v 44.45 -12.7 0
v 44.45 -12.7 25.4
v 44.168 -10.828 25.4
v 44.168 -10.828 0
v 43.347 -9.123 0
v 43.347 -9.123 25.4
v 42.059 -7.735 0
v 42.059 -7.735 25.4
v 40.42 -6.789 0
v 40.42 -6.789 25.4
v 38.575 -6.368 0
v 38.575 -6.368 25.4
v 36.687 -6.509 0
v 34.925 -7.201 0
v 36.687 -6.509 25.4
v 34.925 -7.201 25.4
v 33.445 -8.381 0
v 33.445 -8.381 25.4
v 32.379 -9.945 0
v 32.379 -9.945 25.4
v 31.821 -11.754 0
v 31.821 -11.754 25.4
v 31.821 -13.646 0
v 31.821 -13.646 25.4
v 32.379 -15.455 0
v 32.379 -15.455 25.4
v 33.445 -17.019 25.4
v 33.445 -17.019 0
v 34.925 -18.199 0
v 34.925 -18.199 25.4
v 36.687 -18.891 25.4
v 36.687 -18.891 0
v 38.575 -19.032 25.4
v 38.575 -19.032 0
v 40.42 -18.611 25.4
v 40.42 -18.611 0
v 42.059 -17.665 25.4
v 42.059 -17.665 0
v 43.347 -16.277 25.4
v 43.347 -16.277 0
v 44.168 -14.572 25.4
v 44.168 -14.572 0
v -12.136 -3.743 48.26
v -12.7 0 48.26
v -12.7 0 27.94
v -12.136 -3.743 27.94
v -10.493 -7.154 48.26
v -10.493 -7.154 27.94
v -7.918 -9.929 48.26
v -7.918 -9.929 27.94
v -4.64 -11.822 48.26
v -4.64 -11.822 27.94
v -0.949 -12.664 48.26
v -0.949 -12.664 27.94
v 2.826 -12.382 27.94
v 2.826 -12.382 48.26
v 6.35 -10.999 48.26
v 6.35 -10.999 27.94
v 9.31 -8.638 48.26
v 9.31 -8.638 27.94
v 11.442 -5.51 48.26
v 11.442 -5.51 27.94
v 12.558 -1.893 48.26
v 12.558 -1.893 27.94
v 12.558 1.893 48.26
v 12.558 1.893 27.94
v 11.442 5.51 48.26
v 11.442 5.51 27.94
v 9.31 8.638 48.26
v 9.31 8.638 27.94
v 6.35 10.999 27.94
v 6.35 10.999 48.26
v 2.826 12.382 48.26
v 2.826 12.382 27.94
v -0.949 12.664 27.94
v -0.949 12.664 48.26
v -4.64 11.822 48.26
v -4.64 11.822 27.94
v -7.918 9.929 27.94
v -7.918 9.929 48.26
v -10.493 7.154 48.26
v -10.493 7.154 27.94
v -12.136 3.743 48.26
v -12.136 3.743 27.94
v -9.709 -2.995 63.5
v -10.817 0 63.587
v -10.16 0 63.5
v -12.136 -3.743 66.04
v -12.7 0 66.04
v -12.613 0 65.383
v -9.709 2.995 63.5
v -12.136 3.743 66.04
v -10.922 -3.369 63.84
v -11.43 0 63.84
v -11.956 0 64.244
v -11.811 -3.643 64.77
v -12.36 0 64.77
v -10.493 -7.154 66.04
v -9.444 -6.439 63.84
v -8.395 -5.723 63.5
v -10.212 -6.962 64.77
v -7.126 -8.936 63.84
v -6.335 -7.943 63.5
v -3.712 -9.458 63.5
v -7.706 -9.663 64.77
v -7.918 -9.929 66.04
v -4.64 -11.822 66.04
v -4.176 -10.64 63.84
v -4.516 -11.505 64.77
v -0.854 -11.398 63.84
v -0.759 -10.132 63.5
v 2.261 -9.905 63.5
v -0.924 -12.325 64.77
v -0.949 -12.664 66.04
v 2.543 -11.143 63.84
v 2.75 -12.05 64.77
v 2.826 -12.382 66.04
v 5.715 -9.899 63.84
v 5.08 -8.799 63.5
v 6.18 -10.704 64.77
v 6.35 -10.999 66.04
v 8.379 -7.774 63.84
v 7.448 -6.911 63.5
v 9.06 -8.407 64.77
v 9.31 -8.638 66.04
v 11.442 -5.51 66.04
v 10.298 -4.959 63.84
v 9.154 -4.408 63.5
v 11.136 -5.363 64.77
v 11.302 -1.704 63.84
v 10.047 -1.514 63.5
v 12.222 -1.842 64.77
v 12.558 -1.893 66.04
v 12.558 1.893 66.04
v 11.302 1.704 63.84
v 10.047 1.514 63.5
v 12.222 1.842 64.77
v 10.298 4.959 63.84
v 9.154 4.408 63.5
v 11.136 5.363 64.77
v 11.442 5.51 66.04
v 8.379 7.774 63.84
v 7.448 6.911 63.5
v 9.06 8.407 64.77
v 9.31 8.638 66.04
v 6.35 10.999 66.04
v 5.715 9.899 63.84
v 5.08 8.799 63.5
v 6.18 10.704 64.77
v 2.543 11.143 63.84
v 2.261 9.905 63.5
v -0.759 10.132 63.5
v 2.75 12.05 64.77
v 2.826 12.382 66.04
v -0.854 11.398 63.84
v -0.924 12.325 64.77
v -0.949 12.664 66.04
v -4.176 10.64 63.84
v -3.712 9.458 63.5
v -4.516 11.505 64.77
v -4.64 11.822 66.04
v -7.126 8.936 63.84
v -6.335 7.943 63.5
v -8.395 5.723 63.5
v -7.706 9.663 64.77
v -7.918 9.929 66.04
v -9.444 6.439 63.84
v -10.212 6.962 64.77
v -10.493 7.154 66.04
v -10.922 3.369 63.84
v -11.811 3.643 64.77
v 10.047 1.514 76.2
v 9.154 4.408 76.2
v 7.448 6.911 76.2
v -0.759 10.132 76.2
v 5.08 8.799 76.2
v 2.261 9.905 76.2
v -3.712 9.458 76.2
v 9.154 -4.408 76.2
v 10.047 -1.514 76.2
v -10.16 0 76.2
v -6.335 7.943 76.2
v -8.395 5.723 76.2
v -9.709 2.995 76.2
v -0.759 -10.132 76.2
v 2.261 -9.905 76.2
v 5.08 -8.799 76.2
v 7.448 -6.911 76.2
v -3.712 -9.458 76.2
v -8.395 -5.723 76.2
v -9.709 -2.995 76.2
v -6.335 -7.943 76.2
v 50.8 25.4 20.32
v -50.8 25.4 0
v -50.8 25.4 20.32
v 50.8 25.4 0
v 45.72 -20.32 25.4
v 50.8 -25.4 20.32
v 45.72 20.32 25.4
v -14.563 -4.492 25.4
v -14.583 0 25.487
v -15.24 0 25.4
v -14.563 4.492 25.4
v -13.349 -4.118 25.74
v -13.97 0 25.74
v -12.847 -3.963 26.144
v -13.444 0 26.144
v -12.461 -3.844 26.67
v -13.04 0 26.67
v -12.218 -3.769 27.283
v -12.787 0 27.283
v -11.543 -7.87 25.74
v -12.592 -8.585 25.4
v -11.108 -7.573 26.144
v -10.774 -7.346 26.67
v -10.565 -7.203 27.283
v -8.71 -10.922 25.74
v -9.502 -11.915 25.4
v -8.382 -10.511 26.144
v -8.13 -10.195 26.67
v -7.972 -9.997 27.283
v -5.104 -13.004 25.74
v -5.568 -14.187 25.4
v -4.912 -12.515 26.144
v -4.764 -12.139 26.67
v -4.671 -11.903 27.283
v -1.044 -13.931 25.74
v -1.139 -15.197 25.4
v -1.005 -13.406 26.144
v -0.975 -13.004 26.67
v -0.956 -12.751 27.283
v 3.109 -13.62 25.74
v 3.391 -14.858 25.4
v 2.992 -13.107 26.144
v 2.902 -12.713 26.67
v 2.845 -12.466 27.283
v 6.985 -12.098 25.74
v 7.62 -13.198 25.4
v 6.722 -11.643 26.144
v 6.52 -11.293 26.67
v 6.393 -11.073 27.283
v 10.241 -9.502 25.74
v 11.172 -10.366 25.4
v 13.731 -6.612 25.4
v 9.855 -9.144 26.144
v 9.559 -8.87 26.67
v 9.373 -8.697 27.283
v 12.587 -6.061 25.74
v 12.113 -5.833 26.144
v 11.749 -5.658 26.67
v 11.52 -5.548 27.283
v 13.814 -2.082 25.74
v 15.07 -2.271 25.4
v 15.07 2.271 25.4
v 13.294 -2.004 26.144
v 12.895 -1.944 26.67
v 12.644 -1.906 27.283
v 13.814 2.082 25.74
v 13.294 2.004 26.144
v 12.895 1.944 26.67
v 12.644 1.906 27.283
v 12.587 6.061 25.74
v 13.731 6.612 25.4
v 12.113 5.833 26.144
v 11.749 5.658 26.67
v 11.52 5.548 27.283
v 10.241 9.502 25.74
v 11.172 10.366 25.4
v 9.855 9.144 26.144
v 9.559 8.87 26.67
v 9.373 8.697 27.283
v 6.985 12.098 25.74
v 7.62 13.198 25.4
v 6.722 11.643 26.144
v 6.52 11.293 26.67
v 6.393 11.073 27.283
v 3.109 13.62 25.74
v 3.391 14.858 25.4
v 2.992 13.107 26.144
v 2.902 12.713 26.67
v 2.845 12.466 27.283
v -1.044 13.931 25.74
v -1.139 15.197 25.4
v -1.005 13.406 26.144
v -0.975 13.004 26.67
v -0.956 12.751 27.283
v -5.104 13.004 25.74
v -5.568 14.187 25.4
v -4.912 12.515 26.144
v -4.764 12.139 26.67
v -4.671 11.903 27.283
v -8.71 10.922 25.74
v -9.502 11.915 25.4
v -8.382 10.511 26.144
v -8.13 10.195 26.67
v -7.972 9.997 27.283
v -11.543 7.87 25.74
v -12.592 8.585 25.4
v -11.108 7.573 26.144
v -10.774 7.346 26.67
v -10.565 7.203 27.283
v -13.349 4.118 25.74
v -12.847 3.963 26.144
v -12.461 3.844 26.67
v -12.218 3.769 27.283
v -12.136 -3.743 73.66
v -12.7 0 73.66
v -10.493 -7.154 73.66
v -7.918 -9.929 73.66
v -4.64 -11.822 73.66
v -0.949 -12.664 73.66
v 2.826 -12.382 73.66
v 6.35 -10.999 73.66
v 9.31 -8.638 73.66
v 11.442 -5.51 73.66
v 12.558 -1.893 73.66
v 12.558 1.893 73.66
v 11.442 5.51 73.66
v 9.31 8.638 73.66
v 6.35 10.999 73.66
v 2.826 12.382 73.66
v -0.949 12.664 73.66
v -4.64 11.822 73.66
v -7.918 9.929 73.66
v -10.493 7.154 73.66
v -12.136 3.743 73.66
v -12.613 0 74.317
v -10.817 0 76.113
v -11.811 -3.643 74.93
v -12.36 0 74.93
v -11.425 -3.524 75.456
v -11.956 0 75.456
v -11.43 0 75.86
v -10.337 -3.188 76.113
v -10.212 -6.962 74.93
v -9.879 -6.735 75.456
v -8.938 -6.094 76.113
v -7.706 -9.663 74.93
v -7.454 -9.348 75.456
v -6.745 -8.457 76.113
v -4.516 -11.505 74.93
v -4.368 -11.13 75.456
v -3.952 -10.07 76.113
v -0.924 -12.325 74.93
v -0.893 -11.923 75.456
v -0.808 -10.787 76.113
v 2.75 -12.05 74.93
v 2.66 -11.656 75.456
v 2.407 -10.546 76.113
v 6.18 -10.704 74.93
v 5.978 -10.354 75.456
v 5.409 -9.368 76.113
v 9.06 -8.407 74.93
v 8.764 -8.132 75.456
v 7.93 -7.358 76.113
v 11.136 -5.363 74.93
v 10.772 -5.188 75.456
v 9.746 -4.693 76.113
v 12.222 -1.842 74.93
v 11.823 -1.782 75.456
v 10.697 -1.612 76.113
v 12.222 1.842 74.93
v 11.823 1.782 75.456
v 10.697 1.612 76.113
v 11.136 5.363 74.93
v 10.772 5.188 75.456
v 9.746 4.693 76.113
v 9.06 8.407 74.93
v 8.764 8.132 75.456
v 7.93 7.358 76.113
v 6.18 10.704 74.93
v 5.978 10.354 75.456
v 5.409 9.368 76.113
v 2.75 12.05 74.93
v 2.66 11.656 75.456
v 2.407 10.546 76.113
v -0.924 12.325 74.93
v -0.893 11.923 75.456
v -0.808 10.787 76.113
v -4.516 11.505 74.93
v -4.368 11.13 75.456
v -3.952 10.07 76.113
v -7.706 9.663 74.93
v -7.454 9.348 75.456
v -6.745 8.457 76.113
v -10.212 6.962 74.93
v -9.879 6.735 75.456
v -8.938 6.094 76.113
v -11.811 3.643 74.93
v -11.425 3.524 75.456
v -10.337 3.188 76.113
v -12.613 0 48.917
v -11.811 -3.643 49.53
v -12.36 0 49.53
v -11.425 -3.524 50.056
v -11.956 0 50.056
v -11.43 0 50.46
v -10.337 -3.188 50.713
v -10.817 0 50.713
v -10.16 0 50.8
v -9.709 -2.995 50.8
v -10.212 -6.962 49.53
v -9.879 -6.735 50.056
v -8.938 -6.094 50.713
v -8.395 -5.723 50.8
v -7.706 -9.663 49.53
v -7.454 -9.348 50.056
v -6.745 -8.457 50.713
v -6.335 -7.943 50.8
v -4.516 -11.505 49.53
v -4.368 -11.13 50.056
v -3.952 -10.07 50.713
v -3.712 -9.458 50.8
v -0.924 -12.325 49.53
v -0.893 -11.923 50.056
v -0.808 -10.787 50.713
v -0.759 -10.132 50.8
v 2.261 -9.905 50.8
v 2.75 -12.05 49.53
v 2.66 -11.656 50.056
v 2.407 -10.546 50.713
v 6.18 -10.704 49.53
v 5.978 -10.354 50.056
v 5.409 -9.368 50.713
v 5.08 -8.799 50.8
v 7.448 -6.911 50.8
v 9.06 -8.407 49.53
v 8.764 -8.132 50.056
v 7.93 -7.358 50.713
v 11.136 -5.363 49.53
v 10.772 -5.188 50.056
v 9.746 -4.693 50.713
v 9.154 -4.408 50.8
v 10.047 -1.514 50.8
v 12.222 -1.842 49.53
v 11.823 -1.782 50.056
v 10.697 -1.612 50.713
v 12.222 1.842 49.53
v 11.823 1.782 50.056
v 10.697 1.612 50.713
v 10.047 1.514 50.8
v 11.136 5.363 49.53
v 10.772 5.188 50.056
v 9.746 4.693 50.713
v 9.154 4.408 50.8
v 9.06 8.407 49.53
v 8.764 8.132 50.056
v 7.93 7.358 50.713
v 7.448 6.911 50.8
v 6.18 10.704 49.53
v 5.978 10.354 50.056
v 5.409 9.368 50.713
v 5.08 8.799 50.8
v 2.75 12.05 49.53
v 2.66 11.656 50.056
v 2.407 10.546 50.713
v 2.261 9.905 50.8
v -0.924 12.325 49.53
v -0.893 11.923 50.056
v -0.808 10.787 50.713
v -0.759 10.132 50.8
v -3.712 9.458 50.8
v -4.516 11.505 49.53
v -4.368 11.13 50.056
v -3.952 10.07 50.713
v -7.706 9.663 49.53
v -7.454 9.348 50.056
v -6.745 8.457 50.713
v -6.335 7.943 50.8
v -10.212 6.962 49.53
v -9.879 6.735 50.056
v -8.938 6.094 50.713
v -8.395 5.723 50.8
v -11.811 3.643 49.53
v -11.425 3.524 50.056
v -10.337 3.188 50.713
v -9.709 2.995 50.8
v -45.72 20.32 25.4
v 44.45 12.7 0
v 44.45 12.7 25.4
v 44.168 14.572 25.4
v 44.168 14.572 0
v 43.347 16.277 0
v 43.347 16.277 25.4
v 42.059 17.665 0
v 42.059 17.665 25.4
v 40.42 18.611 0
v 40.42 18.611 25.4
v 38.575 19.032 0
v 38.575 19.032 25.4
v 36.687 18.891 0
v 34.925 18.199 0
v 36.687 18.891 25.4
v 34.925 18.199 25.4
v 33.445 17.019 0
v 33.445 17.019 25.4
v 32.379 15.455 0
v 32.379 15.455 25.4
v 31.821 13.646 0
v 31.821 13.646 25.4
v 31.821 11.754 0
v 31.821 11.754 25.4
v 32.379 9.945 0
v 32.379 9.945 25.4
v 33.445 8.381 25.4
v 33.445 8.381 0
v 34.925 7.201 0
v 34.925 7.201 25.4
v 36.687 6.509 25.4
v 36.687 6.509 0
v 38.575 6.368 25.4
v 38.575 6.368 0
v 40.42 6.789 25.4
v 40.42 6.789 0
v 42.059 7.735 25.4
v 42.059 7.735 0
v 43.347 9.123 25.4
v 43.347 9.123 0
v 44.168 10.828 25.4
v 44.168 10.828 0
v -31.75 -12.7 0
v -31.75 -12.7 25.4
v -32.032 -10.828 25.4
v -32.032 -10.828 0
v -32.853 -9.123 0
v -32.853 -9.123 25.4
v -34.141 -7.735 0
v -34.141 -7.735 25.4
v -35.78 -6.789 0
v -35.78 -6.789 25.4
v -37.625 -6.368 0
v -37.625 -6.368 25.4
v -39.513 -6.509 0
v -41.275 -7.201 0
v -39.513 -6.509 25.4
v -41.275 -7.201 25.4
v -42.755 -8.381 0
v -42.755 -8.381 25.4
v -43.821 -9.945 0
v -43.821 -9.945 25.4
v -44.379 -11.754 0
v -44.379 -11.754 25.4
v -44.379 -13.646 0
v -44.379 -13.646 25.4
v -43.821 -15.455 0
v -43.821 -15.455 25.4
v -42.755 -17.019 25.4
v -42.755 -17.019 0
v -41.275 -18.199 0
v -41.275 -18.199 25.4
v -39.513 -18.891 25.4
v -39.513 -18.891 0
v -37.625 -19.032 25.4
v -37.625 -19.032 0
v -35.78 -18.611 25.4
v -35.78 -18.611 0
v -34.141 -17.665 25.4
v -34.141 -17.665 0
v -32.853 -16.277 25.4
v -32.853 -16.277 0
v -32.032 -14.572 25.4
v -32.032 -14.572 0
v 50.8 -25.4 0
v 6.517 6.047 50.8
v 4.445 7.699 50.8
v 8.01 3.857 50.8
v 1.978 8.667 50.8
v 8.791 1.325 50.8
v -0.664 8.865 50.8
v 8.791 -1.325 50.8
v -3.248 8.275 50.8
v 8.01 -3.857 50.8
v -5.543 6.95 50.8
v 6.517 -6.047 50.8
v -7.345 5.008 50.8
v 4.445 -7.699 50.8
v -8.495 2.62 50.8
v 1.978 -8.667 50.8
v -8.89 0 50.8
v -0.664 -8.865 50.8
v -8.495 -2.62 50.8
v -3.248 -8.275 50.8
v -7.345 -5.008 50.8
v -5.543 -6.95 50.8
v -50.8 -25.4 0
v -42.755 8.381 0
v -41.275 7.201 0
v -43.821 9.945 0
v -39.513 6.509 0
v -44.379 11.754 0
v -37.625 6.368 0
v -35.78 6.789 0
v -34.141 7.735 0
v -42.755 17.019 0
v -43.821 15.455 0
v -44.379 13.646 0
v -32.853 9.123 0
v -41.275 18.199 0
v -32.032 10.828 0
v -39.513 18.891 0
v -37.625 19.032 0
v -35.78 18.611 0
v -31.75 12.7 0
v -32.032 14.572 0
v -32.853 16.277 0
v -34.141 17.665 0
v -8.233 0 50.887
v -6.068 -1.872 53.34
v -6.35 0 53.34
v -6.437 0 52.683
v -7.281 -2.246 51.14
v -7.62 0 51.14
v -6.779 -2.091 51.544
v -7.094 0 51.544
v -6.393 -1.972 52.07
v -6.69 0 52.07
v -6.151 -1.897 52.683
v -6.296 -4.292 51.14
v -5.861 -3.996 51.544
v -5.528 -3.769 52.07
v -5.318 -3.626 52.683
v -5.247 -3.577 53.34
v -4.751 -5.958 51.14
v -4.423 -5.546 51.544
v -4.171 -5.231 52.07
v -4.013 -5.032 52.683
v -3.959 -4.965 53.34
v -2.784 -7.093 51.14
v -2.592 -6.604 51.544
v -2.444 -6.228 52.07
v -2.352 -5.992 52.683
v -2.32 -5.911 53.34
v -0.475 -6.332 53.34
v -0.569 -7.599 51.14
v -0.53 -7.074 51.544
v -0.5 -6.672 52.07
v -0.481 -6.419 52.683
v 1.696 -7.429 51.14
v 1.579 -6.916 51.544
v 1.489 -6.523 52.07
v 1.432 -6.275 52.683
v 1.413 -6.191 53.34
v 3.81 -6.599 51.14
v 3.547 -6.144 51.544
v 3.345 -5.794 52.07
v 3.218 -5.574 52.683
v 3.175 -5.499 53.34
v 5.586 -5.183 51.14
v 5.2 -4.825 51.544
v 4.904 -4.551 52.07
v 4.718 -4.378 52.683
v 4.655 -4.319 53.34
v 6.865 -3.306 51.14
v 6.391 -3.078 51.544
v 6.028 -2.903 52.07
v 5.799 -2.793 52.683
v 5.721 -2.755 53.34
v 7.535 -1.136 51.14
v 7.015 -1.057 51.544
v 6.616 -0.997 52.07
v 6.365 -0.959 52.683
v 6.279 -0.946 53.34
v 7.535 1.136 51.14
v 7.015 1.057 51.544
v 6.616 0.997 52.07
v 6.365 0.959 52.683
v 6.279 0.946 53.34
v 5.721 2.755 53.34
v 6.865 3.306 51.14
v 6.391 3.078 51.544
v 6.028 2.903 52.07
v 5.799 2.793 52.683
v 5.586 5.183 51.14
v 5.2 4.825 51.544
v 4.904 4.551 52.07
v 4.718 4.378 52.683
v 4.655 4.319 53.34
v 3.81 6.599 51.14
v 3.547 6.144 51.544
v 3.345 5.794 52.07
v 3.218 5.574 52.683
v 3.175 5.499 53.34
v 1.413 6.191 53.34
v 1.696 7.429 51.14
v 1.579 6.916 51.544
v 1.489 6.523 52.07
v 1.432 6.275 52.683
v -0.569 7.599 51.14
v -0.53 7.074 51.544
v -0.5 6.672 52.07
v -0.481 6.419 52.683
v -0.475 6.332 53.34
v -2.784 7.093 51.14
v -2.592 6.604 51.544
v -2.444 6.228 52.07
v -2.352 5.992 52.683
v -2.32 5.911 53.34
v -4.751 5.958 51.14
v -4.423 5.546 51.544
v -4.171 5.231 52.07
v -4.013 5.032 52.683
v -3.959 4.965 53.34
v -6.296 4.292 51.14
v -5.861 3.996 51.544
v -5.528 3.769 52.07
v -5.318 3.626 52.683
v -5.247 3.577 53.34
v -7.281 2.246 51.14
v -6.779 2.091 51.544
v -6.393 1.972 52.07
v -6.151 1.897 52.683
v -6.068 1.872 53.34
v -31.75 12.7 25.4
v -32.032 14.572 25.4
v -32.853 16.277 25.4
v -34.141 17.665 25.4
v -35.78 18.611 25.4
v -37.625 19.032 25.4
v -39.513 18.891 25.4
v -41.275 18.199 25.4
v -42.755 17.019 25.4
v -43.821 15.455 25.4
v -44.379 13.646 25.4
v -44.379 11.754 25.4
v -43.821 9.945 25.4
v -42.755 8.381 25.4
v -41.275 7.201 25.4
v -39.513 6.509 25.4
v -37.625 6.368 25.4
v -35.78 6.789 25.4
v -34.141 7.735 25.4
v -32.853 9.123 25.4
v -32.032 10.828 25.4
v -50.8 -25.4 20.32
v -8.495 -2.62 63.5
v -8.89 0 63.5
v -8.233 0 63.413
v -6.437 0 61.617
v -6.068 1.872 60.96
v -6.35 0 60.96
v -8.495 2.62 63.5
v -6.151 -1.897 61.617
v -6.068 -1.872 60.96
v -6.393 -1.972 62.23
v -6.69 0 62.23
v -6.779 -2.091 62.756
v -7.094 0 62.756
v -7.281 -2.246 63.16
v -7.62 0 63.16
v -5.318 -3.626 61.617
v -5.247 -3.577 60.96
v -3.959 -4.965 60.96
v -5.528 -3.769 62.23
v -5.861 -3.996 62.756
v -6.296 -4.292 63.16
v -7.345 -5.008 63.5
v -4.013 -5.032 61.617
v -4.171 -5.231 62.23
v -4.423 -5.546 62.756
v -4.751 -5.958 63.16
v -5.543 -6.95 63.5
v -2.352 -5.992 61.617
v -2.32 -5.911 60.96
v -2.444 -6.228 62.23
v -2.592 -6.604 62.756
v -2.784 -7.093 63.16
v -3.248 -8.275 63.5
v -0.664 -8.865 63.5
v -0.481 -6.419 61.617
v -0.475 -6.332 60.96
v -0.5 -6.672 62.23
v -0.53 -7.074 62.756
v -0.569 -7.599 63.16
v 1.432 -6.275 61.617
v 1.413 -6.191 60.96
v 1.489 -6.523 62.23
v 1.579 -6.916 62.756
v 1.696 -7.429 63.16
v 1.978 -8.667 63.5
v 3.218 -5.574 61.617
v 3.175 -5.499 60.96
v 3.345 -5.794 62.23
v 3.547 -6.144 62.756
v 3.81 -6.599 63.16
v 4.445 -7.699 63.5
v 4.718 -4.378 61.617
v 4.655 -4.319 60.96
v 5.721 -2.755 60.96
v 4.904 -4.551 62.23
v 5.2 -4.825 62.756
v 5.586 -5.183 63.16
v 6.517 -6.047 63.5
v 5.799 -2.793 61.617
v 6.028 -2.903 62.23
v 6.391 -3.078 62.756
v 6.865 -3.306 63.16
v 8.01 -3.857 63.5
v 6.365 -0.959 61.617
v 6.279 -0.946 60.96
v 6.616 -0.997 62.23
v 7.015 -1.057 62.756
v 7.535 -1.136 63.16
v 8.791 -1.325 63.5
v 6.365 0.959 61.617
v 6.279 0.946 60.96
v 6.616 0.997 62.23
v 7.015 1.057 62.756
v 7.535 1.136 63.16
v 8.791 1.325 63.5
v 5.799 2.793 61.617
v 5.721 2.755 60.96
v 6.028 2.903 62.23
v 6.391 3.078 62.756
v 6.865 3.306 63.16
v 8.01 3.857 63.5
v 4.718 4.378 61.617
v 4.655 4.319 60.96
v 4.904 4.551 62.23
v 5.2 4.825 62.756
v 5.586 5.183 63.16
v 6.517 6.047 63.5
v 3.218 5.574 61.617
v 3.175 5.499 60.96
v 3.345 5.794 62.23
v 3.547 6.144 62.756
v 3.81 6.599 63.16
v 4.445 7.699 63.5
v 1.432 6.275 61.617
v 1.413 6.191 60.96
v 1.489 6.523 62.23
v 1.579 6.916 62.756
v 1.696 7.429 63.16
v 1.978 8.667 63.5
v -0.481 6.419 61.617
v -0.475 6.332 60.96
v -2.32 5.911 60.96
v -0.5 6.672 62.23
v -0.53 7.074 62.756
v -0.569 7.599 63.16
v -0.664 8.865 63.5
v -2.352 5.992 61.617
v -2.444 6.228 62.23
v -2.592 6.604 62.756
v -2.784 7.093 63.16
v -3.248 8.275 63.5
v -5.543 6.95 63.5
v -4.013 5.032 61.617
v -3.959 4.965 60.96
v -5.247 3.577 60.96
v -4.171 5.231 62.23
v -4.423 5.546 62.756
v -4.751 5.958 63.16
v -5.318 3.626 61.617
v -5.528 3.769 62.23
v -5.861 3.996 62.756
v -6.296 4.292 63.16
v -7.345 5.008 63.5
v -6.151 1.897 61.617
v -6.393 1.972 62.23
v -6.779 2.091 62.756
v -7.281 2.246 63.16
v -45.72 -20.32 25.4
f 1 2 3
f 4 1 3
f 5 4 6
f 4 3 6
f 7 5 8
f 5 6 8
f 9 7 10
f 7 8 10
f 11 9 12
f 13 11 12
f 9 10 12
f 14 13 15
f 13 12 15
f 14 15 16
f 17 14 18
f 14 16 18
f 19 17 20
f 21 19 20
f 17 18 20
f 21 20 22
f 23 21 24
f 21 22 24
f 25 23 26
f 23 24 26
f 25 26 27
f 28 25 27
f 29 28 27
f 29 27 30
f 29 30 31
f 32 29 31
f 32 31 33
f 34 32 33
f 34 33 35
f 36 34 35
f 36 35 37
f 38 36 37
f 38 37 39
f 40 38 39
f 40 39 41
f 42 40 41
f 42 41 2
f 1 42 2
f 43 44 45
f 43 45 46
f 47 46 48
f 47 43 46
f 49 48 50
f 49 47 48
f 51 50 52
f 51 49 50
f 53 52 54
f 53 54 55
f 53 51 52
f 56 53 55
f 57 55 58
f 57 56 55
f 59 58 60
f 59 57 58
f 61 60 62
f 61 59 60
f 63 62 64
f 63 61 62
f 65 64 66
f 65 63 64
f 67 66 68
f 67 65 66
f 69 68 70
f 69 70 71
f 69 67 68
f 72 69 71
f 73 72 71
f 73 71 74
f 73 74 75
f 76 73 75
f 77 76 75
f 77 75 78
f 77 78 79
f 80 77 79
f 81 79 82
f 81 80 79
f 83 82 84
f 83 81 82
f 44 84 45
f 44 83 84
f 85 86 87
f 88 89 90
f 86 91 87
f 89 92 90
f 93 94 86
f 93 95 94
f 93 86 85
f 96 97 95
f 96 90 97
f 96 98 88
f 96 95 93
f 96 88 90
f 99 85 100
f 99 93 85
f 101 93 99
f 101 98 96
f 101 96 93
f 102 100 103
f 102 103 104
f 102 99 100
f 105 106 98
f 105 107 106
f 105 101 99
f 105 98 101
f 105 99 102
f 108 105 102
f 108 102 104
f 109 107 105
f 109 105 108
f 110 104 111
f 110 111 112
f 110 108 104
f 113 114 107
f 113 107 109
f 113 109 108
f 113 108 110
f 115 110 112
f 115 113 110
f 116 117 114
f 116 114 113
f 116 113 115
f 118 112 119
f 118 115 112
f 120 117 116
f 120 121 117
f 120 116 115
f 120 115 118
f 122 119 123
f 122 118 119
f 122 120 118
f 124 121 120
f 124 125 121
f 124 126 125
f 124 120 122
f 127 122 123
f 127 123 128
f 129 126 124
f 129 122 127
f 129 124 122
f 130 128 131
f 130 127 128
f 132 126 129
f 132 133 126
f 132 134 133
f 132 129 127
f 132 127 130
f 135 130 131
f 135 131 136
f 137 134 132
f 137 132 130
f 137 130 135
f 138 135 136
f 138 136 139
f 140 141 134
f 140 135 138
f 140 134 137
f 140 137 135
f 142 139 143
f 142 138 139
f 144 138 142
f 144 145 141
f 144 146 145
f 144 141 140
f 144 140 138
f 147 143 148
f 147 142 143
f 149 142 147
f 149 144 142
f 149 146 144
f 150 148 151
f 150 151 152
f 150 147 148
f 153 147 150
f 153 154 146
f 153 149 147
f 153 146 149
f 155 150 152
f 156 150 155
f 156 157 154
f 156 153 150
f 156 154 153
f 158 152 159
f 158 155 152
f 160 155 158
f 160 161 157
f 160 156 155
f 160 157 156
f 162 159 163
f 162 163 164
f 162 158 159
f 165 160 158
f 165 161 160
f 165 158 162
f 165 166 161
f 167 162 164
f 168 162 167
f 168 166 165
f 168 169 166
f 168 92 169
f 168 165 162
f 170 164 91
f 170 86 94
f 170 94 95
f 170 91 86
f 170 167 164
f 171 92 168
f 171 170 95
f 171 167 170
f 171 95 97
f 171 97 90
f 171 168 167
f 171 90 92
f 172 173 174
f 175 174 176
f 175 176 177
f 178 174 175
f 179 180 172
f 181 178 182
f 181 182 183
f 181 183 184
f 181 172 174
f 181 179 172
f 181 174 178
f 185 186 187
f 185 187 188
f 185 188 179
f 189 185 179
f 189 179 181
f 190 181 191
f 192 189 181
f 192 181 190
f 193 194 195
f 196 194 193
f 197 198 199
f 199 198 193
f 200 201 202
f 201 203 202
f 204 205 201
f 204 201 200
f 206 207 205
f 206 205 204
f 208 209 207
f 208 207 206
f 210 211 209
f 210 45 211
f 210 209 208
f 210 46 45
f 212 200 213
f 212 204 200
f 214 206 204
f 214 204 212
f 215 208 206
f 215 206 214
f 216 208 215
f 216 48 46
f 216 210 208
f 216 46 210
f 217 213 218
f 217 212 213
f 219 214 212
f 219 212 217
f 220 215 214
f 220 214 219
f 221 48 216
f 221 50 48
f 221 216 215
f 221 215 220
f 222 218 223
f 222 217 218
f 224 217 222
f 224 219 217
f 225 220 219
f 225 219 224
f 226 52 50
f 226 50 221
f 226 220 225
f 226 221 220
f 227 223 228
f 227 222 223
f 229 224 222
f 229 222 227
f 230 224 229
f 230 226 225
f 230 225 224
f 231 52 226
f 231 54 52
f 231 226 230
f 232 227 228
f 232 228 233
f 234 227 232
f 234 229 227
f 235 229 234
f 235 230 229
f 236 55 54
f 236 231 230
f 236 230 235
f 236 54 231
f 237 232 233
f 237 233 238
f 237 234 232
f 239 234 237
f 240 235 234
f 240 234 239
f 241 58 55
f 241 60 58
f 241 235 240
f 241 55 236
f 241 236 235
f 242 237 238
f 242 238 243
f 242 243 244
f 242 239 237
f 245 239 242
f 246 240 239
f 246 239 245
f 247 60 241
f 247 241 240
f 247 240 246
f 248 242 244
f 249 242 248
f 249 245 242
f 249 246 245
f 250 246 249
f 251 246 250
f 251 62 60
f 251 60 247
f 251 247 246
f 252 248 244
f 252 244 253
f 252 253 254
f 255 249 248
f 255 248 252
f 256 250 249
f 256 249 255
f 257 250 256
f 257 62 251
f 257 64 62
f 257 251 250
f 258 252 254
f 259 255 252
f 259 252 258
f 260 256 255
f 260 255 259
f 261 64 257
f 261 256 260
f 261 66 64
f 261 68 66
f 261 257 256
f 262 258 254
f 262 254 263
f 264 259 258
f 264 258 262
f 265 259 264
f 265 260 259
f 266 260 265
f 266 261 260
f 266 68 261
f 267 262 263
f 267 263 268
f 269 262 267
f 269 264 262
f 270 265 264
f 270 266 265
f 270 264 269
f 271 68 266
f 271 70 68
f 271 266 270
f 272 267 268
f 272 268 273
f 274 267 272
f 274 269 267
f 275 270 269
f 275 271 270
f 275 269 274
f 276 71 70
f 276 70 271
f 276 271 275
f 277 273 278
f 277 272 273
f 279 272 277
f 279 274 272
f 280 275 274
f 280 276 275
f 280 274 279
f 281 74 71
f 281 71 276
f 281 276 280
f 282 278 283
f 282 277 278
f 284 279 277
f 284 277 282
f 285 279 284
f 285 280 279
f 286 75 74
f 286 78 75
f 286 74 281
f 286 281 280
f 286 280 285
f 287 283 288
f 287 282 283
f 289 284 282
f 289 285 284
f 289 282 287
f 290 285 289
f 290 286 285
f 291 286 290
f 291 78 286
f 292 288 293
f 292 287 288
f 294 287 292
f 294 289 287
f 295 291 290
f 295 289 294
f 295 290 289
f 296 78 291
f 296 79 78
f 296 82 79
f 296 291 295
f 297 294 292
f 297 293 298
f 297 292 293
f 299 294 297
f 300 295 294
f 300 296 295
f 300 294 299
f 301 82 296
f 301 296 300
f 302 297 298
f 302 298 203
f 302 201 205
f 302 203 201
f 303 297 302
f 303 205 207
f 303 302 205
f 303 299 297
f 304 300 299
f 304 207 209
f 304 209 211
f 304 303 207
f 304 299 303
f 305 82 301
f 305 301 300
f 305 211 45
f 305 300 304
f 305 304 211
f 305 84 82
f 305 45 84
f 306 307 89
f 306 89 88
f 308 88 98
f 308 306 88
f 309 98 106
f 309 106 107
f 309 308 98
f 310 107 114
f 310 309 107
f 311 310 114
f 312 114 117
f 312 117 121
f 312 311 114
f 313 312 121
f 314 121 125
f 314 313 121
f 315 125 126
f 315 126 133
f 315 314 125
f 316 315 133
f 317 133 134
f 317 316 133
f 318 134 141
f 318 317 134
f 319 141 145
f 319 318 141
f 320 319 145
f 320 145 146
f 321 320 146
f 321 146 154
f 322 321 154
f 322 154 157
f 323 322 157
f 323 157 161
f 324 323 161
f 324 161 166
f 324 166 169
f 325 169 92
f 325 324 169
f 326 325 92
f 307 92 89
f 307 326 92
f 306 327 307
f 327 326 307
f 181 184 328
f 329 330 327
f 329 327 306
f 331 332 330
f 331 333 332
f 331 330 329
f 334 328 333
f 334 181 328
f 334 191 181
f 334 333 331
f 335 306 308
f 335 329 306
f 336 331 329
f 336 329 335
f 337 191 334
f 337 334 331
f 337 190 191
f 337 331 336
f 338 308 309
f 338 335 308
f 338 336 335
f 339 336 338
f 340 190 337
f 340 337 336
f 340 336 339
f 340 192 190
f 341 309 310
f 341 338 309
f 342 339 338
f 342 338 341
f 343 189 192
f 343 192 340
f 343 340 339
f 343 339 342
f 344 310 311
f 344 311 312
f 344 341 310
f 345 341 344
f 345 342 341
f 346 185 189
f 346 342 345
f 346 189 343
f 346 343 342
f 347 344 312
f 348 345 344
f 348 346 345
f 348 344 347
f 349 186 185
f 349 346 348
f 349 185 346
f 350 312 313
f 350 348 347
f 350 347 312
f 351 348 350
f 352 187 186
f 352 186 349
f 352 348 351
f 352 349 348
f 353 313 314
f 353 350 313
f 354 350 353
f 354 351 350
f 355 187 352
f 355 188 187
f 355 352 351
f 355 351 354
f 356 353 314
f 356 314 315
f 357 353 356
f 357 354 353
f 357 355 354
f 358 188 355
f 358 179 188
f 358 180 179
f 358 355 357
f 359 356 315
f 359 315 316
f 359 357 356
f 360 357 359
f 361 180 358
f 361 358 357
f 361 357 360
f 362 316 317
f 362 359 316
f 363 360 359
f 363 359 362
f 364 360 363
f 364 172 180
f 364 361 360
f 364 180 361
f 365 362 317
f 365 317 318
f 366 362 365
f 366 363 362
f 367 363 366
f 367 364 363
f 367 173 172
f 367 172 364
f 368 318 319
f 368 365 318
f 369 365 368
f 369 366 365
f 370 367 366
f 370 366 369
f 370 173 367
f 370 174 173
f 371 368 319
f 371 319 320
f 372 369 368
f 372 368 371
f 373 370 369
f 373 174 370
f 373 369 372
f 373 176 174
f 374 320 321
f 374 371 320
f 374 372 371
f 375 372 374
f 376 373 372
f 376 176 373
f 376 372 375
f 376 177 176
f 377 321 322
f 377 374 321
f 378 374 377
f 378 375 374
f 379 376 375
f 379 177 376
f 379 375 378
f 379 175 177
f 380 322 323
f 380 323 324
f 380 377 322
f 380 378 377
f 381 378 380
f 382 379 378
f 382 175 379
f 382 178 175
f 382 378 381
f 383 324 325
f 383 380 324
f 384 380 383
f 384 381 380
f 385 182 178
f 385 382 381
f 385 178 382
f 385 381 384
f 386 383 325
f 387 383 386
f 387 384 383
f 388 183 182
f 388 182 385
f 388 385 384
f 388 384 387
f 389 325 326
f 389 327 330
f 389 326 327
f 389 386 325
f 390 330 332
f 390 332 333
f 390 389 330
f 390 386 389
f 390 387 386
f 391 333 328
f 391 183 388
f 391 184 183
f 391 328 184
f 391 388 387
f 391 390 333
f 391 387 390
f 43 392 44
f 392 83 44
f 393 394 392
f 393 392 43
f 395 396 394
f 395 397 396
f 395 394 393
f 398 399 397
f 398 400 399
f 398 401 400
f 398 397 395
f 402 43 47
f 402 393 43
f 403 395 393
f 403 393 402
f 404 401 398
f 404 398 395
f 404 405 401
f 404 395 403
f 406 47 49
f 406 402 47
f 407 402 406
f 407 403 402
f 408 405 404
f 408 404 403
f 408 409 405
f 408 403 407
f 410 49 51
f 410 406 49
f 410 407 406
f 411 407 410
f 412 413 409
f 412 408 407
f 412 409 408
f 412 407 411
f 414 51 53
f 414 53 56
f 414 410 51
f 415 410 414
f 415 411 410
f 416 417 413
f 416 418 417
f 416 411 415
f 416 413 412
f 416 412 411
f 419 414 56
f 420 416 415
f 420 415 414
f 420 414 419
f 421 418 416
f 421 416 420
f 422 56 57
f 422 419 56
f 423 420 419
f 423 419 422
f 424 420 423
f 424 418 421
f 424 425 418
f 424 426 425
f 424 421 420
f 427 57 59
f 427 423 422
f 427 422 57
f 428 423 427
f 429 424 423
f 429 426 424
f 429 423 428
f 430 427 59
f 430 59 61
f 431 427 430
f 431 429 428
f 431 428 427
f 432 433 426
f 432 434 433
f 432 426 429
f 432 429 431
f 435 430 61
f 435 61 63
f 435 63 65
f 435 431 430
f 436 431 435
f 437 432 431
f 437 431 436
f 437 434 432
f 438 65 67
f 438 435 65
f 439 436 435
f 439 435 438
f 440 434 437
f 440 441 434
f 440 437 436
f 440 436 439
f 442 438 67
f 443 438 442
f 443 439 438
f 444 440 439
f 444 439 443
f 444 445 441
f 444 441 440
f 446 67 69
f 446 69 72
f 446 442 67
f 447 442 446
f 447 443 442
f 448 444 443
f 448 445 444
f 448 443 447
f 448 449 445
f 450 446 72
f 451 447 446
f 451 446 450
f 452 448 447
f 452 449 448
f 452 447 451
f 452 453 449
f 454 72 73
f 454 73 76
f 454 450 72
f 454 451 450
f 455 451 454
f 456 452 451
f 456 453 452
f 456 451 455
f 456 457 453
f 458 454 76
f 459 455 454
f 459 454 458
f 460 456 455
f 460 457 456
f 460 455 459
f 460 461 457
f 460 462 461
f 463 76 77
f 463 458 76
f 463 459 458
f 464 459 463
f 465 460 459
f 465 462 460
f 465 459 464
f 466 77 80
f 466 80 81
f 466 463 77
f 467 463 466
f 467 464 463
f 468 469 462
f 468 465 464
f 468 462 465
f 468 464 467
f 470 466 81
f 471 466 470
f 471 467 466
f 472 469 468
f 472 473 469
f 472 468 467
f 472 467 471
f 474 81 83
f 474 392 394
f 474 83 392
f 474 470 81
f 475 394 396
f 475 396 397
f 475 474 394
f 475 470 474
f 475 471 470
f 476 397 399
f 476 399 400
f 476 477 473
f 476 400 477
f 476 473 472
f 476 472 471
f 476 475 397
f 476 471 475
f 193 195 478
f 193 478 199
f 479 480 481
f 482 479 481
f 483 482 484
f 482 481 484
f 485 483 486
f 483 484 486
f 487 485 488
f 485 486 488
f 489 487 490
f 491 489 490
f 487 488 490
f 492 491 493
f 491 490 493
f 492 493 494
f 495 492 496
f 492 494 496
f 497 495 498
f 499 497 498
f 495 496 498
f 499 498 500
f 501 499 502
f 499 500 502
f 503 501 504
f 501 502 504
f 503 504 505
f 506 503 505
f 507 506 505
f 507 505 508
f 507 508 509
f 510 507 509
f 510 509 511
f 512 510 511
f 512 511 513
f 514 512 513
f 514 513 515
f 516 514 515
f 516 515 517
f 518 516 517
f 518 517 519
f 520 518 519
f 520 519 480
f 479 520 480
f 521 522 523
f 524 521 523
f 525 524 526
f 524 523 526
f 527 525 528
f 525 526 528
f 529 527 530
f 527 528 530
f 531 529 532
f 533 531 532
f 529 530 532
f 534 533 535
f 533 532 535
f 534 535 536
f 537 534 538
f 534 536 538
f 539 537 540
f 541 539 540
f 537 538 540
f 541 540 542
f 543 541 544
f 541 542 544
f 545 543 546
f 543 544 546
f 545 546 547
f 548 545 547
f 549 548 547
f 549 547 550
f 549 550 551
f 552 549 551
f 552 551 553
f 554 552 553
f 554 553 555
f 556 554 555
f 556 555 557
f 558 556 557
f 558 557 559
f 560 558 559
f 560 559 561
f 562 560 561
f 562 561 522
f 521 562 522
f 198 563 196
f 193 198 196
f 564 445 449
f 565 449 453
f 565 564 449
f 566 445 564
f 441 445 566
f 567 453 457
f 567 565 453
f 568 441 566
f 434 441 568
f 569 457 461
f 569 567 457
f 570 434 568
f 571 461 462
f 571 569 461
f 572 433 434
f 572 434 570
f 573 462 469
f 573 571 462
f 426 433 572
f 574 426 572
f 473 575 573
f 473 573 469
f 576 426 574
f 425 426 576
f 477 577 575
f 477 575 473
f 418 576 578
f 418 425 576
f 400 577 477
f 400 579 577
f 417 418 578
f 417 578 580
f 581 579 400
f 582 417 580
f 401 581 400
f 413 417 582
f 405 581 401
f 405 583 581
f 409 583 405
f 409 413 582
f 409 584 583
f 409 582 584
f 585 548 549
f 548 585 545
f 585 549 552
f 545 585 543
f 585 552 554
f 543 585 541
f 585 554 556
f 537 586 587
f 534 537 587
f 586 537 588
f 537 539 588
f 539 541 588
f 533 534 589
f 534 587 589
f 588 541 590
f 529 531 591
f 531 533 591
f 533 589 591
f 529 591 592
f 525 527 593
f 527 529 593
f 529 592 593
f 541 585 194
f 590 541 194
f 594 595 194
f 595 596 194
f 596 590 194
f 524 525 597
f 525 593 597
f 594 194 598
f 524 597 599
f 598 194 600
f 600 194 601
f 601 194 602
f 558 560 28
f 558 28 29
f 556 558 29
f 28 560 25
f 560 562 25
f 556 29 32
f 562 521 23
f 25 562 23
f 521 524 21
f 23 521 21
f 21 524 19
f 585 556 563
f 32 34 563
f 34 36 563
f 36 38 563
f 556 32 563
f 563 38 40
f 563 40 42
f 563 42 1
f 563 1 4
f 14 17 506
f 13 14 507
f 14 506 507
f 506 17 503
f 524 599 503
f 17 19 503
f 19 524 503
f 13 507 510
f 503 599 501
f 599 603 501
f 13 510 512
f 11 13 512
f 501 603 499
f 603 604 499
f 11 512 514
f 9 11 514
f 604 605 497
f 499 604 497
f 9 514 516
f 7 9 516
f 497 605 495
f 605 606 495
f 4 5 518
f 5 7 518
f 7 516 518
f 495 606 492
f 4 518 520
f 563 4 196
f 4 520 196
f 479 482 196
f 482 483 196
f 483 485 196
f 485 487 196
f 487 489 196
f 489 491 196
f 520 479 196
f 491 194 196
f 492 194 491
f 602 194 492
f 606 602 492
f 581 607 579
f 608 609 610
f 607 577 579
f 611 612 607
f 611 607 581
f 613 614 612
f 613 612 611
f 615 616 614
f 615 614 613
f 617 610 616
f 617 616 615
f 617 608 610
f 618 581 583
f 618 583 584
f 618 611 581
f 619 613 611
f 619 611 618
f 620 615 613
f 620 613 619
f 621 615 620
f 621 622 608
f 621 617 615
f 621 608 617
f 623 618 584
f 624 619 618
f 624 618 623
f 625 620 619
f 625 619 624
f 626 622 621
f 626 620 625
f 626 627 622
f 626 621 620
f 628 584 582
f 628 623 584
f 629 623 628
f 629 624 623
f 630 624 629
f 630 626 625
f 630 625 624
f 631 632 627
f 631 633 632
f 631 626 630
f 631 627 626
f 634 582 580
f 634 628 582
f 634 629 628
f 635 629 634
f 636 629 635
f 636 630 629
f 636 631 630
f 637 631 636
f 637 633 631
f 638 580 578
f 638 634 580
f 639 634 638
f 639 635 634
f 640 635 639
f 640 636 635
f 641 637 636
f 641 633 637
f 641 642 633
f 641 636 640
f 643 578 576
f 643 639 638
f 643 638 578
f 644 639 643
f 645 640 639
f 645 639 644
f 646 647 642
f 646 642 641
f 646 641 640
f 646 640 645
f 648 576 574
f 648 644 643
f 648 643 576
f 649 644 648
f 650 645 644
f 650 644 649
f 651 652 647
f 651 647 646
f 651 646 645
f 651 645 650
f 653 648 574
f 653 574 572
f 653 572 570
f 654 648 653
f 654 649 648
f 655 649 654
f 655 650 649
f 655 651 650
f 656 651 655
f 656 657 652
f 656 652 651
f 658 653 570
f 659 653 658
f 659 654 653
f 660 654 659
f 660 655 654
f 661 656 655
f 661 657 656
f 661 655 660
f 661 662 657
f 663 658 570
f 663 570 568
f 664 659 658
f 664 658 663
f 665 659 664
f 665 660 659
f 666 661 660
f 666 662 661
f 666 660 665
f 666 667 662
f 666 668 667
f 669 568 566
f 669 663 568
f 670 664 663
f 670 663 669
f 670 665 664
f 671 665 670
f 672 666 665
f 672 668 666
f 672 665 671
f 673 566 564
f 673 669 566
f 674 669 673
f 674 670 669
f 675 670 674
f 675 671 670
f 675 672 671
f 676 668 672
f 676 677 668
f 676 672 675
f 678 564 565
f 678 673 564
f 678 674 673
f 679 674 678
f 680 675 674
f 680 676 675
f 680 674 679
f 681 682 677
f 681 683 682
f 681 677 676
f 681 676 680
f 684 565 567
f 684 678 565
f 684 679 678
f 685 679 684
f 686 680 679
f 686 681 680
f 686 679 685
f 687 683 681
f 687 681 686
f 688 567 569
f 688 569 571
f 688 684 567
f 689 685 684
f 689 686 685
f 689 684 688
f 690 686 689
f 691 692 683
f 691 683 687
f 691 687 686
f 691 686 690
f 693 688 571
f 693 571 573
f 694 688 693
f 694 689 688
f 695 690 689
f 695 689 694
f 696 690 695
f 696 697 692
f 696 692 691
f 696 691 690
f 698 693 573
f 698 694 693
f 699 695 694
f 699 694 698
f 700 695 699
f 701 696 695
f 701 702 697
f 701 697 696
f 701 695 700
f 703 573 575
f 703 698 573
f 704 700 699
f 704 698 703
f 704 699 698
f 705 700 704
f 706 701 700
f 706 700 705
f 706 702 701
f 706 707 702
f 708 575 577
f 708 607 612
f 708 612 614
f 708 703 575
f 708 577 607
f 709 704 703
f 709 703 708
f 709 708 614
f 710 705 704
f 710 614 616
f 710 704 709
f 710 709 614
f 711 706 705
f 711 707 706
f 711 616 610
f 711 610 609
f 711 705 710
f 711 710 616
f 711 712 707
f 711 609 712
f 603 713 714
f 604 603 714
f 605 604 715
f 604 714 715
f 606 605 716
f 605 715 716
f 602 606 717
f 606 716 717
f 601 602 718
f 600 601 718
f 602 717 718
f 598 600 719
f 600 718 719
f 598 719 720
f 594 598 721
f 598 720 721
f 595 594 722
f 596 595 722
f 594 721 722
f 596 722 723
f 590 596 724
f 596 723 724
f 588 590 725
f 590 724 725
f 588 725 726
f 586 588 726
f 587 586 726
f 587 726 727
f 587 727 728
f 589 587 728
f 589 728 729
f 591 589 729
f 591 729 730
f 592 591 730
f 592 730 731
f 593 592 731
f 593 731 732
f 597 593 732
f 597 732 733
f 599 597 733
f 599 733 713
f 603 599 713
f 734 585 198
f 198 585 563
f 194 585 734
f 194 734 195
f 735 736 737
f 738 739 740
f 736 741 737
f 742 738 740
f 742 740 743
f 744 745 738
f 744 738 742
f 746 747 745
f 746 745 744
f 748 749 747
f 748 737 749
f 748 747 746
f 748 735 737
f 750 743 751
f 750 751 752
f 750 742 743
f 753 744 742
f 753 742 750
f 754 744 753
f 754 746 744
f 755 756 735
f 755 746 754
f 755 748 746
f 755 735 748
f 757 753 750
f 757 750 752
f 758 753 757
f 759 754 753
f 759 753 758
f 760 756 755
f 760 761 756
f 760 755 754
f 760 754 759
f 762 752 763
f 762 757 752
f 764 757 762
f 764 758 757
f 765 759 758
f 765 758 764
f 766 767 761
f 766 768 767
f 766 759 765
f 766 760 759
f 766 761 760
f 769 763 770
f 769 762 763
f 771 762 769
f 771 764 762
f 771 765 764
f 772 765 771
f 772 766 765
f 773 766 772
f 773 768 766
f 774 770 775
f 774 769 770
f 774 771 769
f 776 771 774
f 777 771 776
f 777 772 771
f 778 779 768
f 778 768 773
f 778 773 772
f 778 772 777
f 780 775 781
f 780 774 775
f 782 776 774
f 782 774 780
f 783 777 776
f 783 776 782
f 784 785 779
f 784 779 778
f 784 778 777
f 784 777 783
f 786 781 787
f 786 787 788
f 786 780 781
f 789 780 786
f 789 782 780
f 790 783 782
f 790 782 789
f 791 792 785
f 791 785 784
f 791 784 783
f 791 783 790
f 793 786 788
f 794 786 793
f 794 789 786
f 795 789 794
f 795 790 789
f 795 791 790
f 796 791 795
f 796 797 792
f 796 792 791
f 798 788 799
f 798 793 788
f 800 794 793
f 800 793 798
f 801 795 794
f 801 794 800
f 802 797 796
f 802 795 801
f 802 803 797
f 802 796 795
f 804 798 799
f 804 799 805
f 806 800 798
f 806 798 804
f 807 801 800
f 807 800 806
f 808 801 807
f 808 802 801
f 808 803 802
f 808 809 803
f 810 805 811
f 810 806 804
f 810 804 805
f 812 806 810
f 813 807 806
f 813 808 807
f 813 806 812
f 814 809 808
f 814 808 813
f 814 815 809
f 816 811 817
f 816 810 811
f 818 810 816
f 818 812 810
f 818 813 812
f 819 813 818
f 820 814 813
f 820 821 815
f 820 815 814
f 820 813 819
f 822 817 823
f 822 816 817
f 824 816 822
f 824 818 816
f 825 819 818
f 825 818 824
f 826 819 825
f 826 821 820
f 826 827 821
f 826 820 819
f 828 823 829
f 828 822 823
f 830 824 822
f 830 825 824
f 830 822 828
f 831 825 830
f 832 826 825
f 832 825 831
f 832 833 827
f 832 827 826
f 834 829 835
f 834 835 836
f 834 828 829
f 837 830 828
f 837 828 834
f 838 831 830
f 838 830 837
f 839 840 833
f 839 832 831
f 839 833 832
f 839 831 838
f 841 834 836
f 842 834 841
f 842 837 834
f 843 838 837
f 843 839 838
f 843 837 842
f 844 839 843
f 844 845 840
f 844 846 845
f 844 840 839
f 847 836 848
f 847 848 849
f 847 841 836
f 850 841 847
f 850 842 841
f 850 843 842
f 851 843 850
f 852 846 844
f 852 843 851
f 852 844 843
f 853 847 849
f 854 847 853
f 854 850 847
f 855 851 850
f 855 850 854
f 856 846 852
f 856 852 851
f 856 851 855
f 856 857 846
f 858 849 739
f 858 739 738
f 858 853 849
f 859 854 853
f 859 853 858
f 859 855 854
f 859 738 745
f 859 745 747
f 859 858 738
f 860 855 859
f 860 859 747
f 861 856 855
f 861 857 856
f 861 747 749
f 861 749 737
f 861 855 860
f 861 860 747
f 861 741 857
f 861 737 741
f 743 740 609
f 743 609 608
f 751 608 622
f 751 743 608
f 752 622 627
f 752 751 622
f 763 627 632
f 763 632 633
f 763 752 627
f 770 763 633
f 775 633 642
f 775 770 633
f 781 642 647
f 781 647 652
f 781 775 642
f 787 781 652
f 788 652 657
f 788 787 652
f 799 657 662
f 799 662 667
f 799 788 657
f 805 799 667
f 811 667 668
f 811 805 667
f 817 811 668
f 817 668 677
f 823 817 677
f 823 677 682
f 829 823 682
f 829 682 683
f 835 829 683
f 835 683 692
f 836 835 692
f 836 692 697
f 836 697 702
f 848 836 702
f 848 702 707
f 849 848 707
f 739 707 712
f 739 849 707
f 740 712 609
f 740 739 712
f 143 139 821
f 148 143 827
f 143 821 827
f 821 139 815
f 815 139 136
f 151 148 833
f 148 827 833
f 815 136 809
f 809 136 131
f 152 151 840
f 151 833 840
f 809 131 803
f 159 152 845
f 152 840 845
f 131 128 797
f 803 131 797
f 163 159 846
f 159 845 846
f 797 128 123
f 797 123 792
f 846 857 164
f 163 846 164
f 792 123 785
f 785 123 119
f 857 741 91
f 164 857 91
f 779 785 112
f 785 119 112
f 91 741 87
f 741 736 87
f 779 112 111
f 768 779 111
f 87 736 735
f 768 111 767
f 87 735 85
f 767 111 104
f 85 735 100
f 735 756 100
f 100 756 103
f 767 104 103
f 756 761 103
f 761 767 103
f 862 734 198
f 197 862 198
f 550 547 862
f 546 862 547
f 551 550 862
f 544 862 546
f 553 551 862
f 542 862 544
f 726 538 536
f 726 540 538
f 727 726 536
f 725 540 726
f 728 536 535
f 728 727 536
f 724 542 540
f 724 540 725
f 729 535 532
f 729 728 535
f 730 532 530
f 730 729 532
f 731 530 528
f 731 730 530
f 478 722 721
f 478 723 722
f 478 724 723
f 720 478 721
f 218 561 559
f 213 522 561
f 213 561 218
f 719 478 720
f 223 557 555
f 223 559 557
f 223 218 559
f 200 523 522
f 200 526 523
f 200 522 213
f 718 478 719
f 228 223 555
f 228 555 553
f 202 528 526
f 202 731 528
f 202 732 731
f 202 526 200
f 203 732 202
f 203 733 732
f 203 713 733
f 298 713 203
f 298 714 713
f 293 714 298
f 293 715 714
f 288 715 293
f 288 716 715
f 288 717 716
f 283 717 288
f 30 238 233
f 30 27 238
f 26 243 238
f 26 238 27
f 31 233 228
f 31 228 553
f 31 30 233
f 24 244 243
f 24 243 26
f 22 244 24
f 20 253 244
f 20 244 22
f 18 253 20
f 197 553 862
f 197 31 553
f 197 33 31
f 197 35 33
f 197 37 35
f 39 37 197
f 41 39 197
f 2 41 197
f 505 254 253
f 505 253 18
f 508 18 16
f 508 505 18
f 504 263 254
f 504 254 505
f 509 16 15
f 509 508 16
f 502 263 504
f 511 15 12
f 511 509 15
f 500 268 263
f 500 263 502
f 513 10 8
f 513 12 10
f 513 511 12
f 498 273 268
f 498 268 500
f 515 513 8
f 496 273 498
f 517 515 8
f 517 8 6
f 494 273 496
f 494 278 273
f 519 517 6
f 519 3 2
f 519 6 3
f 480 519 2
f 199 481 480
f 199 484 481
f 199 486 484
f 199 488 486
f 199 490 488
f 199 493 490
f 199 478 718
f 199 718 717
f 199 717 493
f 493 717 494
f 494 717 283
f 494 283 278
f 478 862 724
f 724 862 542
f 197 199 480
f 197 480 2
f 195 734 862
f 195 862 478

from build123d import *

# Parameters (mm, degrees)
F0_W     = 101.6
F0_H     = 50.8
F1_DEPTH = 25.4
F2_R     = 6.35
F3_DEPTH = 25.401
F4_W     = 12.7
F4_H     = 50.8
F6_W     = 12.7
F6_H     = 12.7
F8_R     = 2.54
F9_SIZE  = 5.08


with BuildPart() as f1:
    # F0 (on Top) → F1 (new body)
    with BuildSketch(Plane.XY):
        Rectangle(F0_W, F0_H)
    extrude(amount=F1_DEPTH)

    # F2 (on face) → F3 (cut, through all)
    with BuildSketch(Plane.XY.offset(25.4)):
        with Locations((-38.1, 12.7)):
            Circle(F2_R)
        with Locations((38.1, 12.7)):
            Circle(F2_R)
        with Locations((38.1, -12.7)):
            Circle(F2_R)
        with Locations((-38.1, -12.7)):
            Circle(F2_R)
    extrude(amount=-F3_DEPTH, mode=Mode.SUBTRACT)

    # F4 (on Front) → F5 (revolve)
    with BuildSketch(Plane.XZ):
        with Locations((-6.35, 50.8)):
            Rectangle(F4_W, F4_H)
    revolve(axis=Axis((0, 0, 50.8), (0, 0, 1)))

    # F6 (on Front) → F7 (revolve, cut)
    with BuildSketch(Plane.XZ):
        with Locations((-12.7, 57.15)):
            Rectangle(F6_W, F6_H)
    revolve(axis=Axis((0, 0, 44.482126832), (0, 0, 1)), mode=Mode.SUBTRACT)

    # F8
    f8_edges = [f1.edges().sort_by_distance(p)[0] for p in [
        (12.7, 0, 50.8),
        (6.35, 0, 50.8),
        (12.7, 0, 63.5),
        (6.35, 0, 63.5),
        (12.7, 0, 25.4),
        (12.7, 0, 76.2),
    ]]
    fillet(f8_edges, radius=F8_R)

    # F9
    f9_edges = [f1.edges().sort_by_distance(p)[0] for p in [
        (0, 25.4, 25.4),
        (50.8, 0, 25.4),
        (0, -25.4, 25.4),
        (-50.8, 0, 25.4),
    ]]
    chamfer(f9_edges, length=F9_SIZE)


solid = f1.part
